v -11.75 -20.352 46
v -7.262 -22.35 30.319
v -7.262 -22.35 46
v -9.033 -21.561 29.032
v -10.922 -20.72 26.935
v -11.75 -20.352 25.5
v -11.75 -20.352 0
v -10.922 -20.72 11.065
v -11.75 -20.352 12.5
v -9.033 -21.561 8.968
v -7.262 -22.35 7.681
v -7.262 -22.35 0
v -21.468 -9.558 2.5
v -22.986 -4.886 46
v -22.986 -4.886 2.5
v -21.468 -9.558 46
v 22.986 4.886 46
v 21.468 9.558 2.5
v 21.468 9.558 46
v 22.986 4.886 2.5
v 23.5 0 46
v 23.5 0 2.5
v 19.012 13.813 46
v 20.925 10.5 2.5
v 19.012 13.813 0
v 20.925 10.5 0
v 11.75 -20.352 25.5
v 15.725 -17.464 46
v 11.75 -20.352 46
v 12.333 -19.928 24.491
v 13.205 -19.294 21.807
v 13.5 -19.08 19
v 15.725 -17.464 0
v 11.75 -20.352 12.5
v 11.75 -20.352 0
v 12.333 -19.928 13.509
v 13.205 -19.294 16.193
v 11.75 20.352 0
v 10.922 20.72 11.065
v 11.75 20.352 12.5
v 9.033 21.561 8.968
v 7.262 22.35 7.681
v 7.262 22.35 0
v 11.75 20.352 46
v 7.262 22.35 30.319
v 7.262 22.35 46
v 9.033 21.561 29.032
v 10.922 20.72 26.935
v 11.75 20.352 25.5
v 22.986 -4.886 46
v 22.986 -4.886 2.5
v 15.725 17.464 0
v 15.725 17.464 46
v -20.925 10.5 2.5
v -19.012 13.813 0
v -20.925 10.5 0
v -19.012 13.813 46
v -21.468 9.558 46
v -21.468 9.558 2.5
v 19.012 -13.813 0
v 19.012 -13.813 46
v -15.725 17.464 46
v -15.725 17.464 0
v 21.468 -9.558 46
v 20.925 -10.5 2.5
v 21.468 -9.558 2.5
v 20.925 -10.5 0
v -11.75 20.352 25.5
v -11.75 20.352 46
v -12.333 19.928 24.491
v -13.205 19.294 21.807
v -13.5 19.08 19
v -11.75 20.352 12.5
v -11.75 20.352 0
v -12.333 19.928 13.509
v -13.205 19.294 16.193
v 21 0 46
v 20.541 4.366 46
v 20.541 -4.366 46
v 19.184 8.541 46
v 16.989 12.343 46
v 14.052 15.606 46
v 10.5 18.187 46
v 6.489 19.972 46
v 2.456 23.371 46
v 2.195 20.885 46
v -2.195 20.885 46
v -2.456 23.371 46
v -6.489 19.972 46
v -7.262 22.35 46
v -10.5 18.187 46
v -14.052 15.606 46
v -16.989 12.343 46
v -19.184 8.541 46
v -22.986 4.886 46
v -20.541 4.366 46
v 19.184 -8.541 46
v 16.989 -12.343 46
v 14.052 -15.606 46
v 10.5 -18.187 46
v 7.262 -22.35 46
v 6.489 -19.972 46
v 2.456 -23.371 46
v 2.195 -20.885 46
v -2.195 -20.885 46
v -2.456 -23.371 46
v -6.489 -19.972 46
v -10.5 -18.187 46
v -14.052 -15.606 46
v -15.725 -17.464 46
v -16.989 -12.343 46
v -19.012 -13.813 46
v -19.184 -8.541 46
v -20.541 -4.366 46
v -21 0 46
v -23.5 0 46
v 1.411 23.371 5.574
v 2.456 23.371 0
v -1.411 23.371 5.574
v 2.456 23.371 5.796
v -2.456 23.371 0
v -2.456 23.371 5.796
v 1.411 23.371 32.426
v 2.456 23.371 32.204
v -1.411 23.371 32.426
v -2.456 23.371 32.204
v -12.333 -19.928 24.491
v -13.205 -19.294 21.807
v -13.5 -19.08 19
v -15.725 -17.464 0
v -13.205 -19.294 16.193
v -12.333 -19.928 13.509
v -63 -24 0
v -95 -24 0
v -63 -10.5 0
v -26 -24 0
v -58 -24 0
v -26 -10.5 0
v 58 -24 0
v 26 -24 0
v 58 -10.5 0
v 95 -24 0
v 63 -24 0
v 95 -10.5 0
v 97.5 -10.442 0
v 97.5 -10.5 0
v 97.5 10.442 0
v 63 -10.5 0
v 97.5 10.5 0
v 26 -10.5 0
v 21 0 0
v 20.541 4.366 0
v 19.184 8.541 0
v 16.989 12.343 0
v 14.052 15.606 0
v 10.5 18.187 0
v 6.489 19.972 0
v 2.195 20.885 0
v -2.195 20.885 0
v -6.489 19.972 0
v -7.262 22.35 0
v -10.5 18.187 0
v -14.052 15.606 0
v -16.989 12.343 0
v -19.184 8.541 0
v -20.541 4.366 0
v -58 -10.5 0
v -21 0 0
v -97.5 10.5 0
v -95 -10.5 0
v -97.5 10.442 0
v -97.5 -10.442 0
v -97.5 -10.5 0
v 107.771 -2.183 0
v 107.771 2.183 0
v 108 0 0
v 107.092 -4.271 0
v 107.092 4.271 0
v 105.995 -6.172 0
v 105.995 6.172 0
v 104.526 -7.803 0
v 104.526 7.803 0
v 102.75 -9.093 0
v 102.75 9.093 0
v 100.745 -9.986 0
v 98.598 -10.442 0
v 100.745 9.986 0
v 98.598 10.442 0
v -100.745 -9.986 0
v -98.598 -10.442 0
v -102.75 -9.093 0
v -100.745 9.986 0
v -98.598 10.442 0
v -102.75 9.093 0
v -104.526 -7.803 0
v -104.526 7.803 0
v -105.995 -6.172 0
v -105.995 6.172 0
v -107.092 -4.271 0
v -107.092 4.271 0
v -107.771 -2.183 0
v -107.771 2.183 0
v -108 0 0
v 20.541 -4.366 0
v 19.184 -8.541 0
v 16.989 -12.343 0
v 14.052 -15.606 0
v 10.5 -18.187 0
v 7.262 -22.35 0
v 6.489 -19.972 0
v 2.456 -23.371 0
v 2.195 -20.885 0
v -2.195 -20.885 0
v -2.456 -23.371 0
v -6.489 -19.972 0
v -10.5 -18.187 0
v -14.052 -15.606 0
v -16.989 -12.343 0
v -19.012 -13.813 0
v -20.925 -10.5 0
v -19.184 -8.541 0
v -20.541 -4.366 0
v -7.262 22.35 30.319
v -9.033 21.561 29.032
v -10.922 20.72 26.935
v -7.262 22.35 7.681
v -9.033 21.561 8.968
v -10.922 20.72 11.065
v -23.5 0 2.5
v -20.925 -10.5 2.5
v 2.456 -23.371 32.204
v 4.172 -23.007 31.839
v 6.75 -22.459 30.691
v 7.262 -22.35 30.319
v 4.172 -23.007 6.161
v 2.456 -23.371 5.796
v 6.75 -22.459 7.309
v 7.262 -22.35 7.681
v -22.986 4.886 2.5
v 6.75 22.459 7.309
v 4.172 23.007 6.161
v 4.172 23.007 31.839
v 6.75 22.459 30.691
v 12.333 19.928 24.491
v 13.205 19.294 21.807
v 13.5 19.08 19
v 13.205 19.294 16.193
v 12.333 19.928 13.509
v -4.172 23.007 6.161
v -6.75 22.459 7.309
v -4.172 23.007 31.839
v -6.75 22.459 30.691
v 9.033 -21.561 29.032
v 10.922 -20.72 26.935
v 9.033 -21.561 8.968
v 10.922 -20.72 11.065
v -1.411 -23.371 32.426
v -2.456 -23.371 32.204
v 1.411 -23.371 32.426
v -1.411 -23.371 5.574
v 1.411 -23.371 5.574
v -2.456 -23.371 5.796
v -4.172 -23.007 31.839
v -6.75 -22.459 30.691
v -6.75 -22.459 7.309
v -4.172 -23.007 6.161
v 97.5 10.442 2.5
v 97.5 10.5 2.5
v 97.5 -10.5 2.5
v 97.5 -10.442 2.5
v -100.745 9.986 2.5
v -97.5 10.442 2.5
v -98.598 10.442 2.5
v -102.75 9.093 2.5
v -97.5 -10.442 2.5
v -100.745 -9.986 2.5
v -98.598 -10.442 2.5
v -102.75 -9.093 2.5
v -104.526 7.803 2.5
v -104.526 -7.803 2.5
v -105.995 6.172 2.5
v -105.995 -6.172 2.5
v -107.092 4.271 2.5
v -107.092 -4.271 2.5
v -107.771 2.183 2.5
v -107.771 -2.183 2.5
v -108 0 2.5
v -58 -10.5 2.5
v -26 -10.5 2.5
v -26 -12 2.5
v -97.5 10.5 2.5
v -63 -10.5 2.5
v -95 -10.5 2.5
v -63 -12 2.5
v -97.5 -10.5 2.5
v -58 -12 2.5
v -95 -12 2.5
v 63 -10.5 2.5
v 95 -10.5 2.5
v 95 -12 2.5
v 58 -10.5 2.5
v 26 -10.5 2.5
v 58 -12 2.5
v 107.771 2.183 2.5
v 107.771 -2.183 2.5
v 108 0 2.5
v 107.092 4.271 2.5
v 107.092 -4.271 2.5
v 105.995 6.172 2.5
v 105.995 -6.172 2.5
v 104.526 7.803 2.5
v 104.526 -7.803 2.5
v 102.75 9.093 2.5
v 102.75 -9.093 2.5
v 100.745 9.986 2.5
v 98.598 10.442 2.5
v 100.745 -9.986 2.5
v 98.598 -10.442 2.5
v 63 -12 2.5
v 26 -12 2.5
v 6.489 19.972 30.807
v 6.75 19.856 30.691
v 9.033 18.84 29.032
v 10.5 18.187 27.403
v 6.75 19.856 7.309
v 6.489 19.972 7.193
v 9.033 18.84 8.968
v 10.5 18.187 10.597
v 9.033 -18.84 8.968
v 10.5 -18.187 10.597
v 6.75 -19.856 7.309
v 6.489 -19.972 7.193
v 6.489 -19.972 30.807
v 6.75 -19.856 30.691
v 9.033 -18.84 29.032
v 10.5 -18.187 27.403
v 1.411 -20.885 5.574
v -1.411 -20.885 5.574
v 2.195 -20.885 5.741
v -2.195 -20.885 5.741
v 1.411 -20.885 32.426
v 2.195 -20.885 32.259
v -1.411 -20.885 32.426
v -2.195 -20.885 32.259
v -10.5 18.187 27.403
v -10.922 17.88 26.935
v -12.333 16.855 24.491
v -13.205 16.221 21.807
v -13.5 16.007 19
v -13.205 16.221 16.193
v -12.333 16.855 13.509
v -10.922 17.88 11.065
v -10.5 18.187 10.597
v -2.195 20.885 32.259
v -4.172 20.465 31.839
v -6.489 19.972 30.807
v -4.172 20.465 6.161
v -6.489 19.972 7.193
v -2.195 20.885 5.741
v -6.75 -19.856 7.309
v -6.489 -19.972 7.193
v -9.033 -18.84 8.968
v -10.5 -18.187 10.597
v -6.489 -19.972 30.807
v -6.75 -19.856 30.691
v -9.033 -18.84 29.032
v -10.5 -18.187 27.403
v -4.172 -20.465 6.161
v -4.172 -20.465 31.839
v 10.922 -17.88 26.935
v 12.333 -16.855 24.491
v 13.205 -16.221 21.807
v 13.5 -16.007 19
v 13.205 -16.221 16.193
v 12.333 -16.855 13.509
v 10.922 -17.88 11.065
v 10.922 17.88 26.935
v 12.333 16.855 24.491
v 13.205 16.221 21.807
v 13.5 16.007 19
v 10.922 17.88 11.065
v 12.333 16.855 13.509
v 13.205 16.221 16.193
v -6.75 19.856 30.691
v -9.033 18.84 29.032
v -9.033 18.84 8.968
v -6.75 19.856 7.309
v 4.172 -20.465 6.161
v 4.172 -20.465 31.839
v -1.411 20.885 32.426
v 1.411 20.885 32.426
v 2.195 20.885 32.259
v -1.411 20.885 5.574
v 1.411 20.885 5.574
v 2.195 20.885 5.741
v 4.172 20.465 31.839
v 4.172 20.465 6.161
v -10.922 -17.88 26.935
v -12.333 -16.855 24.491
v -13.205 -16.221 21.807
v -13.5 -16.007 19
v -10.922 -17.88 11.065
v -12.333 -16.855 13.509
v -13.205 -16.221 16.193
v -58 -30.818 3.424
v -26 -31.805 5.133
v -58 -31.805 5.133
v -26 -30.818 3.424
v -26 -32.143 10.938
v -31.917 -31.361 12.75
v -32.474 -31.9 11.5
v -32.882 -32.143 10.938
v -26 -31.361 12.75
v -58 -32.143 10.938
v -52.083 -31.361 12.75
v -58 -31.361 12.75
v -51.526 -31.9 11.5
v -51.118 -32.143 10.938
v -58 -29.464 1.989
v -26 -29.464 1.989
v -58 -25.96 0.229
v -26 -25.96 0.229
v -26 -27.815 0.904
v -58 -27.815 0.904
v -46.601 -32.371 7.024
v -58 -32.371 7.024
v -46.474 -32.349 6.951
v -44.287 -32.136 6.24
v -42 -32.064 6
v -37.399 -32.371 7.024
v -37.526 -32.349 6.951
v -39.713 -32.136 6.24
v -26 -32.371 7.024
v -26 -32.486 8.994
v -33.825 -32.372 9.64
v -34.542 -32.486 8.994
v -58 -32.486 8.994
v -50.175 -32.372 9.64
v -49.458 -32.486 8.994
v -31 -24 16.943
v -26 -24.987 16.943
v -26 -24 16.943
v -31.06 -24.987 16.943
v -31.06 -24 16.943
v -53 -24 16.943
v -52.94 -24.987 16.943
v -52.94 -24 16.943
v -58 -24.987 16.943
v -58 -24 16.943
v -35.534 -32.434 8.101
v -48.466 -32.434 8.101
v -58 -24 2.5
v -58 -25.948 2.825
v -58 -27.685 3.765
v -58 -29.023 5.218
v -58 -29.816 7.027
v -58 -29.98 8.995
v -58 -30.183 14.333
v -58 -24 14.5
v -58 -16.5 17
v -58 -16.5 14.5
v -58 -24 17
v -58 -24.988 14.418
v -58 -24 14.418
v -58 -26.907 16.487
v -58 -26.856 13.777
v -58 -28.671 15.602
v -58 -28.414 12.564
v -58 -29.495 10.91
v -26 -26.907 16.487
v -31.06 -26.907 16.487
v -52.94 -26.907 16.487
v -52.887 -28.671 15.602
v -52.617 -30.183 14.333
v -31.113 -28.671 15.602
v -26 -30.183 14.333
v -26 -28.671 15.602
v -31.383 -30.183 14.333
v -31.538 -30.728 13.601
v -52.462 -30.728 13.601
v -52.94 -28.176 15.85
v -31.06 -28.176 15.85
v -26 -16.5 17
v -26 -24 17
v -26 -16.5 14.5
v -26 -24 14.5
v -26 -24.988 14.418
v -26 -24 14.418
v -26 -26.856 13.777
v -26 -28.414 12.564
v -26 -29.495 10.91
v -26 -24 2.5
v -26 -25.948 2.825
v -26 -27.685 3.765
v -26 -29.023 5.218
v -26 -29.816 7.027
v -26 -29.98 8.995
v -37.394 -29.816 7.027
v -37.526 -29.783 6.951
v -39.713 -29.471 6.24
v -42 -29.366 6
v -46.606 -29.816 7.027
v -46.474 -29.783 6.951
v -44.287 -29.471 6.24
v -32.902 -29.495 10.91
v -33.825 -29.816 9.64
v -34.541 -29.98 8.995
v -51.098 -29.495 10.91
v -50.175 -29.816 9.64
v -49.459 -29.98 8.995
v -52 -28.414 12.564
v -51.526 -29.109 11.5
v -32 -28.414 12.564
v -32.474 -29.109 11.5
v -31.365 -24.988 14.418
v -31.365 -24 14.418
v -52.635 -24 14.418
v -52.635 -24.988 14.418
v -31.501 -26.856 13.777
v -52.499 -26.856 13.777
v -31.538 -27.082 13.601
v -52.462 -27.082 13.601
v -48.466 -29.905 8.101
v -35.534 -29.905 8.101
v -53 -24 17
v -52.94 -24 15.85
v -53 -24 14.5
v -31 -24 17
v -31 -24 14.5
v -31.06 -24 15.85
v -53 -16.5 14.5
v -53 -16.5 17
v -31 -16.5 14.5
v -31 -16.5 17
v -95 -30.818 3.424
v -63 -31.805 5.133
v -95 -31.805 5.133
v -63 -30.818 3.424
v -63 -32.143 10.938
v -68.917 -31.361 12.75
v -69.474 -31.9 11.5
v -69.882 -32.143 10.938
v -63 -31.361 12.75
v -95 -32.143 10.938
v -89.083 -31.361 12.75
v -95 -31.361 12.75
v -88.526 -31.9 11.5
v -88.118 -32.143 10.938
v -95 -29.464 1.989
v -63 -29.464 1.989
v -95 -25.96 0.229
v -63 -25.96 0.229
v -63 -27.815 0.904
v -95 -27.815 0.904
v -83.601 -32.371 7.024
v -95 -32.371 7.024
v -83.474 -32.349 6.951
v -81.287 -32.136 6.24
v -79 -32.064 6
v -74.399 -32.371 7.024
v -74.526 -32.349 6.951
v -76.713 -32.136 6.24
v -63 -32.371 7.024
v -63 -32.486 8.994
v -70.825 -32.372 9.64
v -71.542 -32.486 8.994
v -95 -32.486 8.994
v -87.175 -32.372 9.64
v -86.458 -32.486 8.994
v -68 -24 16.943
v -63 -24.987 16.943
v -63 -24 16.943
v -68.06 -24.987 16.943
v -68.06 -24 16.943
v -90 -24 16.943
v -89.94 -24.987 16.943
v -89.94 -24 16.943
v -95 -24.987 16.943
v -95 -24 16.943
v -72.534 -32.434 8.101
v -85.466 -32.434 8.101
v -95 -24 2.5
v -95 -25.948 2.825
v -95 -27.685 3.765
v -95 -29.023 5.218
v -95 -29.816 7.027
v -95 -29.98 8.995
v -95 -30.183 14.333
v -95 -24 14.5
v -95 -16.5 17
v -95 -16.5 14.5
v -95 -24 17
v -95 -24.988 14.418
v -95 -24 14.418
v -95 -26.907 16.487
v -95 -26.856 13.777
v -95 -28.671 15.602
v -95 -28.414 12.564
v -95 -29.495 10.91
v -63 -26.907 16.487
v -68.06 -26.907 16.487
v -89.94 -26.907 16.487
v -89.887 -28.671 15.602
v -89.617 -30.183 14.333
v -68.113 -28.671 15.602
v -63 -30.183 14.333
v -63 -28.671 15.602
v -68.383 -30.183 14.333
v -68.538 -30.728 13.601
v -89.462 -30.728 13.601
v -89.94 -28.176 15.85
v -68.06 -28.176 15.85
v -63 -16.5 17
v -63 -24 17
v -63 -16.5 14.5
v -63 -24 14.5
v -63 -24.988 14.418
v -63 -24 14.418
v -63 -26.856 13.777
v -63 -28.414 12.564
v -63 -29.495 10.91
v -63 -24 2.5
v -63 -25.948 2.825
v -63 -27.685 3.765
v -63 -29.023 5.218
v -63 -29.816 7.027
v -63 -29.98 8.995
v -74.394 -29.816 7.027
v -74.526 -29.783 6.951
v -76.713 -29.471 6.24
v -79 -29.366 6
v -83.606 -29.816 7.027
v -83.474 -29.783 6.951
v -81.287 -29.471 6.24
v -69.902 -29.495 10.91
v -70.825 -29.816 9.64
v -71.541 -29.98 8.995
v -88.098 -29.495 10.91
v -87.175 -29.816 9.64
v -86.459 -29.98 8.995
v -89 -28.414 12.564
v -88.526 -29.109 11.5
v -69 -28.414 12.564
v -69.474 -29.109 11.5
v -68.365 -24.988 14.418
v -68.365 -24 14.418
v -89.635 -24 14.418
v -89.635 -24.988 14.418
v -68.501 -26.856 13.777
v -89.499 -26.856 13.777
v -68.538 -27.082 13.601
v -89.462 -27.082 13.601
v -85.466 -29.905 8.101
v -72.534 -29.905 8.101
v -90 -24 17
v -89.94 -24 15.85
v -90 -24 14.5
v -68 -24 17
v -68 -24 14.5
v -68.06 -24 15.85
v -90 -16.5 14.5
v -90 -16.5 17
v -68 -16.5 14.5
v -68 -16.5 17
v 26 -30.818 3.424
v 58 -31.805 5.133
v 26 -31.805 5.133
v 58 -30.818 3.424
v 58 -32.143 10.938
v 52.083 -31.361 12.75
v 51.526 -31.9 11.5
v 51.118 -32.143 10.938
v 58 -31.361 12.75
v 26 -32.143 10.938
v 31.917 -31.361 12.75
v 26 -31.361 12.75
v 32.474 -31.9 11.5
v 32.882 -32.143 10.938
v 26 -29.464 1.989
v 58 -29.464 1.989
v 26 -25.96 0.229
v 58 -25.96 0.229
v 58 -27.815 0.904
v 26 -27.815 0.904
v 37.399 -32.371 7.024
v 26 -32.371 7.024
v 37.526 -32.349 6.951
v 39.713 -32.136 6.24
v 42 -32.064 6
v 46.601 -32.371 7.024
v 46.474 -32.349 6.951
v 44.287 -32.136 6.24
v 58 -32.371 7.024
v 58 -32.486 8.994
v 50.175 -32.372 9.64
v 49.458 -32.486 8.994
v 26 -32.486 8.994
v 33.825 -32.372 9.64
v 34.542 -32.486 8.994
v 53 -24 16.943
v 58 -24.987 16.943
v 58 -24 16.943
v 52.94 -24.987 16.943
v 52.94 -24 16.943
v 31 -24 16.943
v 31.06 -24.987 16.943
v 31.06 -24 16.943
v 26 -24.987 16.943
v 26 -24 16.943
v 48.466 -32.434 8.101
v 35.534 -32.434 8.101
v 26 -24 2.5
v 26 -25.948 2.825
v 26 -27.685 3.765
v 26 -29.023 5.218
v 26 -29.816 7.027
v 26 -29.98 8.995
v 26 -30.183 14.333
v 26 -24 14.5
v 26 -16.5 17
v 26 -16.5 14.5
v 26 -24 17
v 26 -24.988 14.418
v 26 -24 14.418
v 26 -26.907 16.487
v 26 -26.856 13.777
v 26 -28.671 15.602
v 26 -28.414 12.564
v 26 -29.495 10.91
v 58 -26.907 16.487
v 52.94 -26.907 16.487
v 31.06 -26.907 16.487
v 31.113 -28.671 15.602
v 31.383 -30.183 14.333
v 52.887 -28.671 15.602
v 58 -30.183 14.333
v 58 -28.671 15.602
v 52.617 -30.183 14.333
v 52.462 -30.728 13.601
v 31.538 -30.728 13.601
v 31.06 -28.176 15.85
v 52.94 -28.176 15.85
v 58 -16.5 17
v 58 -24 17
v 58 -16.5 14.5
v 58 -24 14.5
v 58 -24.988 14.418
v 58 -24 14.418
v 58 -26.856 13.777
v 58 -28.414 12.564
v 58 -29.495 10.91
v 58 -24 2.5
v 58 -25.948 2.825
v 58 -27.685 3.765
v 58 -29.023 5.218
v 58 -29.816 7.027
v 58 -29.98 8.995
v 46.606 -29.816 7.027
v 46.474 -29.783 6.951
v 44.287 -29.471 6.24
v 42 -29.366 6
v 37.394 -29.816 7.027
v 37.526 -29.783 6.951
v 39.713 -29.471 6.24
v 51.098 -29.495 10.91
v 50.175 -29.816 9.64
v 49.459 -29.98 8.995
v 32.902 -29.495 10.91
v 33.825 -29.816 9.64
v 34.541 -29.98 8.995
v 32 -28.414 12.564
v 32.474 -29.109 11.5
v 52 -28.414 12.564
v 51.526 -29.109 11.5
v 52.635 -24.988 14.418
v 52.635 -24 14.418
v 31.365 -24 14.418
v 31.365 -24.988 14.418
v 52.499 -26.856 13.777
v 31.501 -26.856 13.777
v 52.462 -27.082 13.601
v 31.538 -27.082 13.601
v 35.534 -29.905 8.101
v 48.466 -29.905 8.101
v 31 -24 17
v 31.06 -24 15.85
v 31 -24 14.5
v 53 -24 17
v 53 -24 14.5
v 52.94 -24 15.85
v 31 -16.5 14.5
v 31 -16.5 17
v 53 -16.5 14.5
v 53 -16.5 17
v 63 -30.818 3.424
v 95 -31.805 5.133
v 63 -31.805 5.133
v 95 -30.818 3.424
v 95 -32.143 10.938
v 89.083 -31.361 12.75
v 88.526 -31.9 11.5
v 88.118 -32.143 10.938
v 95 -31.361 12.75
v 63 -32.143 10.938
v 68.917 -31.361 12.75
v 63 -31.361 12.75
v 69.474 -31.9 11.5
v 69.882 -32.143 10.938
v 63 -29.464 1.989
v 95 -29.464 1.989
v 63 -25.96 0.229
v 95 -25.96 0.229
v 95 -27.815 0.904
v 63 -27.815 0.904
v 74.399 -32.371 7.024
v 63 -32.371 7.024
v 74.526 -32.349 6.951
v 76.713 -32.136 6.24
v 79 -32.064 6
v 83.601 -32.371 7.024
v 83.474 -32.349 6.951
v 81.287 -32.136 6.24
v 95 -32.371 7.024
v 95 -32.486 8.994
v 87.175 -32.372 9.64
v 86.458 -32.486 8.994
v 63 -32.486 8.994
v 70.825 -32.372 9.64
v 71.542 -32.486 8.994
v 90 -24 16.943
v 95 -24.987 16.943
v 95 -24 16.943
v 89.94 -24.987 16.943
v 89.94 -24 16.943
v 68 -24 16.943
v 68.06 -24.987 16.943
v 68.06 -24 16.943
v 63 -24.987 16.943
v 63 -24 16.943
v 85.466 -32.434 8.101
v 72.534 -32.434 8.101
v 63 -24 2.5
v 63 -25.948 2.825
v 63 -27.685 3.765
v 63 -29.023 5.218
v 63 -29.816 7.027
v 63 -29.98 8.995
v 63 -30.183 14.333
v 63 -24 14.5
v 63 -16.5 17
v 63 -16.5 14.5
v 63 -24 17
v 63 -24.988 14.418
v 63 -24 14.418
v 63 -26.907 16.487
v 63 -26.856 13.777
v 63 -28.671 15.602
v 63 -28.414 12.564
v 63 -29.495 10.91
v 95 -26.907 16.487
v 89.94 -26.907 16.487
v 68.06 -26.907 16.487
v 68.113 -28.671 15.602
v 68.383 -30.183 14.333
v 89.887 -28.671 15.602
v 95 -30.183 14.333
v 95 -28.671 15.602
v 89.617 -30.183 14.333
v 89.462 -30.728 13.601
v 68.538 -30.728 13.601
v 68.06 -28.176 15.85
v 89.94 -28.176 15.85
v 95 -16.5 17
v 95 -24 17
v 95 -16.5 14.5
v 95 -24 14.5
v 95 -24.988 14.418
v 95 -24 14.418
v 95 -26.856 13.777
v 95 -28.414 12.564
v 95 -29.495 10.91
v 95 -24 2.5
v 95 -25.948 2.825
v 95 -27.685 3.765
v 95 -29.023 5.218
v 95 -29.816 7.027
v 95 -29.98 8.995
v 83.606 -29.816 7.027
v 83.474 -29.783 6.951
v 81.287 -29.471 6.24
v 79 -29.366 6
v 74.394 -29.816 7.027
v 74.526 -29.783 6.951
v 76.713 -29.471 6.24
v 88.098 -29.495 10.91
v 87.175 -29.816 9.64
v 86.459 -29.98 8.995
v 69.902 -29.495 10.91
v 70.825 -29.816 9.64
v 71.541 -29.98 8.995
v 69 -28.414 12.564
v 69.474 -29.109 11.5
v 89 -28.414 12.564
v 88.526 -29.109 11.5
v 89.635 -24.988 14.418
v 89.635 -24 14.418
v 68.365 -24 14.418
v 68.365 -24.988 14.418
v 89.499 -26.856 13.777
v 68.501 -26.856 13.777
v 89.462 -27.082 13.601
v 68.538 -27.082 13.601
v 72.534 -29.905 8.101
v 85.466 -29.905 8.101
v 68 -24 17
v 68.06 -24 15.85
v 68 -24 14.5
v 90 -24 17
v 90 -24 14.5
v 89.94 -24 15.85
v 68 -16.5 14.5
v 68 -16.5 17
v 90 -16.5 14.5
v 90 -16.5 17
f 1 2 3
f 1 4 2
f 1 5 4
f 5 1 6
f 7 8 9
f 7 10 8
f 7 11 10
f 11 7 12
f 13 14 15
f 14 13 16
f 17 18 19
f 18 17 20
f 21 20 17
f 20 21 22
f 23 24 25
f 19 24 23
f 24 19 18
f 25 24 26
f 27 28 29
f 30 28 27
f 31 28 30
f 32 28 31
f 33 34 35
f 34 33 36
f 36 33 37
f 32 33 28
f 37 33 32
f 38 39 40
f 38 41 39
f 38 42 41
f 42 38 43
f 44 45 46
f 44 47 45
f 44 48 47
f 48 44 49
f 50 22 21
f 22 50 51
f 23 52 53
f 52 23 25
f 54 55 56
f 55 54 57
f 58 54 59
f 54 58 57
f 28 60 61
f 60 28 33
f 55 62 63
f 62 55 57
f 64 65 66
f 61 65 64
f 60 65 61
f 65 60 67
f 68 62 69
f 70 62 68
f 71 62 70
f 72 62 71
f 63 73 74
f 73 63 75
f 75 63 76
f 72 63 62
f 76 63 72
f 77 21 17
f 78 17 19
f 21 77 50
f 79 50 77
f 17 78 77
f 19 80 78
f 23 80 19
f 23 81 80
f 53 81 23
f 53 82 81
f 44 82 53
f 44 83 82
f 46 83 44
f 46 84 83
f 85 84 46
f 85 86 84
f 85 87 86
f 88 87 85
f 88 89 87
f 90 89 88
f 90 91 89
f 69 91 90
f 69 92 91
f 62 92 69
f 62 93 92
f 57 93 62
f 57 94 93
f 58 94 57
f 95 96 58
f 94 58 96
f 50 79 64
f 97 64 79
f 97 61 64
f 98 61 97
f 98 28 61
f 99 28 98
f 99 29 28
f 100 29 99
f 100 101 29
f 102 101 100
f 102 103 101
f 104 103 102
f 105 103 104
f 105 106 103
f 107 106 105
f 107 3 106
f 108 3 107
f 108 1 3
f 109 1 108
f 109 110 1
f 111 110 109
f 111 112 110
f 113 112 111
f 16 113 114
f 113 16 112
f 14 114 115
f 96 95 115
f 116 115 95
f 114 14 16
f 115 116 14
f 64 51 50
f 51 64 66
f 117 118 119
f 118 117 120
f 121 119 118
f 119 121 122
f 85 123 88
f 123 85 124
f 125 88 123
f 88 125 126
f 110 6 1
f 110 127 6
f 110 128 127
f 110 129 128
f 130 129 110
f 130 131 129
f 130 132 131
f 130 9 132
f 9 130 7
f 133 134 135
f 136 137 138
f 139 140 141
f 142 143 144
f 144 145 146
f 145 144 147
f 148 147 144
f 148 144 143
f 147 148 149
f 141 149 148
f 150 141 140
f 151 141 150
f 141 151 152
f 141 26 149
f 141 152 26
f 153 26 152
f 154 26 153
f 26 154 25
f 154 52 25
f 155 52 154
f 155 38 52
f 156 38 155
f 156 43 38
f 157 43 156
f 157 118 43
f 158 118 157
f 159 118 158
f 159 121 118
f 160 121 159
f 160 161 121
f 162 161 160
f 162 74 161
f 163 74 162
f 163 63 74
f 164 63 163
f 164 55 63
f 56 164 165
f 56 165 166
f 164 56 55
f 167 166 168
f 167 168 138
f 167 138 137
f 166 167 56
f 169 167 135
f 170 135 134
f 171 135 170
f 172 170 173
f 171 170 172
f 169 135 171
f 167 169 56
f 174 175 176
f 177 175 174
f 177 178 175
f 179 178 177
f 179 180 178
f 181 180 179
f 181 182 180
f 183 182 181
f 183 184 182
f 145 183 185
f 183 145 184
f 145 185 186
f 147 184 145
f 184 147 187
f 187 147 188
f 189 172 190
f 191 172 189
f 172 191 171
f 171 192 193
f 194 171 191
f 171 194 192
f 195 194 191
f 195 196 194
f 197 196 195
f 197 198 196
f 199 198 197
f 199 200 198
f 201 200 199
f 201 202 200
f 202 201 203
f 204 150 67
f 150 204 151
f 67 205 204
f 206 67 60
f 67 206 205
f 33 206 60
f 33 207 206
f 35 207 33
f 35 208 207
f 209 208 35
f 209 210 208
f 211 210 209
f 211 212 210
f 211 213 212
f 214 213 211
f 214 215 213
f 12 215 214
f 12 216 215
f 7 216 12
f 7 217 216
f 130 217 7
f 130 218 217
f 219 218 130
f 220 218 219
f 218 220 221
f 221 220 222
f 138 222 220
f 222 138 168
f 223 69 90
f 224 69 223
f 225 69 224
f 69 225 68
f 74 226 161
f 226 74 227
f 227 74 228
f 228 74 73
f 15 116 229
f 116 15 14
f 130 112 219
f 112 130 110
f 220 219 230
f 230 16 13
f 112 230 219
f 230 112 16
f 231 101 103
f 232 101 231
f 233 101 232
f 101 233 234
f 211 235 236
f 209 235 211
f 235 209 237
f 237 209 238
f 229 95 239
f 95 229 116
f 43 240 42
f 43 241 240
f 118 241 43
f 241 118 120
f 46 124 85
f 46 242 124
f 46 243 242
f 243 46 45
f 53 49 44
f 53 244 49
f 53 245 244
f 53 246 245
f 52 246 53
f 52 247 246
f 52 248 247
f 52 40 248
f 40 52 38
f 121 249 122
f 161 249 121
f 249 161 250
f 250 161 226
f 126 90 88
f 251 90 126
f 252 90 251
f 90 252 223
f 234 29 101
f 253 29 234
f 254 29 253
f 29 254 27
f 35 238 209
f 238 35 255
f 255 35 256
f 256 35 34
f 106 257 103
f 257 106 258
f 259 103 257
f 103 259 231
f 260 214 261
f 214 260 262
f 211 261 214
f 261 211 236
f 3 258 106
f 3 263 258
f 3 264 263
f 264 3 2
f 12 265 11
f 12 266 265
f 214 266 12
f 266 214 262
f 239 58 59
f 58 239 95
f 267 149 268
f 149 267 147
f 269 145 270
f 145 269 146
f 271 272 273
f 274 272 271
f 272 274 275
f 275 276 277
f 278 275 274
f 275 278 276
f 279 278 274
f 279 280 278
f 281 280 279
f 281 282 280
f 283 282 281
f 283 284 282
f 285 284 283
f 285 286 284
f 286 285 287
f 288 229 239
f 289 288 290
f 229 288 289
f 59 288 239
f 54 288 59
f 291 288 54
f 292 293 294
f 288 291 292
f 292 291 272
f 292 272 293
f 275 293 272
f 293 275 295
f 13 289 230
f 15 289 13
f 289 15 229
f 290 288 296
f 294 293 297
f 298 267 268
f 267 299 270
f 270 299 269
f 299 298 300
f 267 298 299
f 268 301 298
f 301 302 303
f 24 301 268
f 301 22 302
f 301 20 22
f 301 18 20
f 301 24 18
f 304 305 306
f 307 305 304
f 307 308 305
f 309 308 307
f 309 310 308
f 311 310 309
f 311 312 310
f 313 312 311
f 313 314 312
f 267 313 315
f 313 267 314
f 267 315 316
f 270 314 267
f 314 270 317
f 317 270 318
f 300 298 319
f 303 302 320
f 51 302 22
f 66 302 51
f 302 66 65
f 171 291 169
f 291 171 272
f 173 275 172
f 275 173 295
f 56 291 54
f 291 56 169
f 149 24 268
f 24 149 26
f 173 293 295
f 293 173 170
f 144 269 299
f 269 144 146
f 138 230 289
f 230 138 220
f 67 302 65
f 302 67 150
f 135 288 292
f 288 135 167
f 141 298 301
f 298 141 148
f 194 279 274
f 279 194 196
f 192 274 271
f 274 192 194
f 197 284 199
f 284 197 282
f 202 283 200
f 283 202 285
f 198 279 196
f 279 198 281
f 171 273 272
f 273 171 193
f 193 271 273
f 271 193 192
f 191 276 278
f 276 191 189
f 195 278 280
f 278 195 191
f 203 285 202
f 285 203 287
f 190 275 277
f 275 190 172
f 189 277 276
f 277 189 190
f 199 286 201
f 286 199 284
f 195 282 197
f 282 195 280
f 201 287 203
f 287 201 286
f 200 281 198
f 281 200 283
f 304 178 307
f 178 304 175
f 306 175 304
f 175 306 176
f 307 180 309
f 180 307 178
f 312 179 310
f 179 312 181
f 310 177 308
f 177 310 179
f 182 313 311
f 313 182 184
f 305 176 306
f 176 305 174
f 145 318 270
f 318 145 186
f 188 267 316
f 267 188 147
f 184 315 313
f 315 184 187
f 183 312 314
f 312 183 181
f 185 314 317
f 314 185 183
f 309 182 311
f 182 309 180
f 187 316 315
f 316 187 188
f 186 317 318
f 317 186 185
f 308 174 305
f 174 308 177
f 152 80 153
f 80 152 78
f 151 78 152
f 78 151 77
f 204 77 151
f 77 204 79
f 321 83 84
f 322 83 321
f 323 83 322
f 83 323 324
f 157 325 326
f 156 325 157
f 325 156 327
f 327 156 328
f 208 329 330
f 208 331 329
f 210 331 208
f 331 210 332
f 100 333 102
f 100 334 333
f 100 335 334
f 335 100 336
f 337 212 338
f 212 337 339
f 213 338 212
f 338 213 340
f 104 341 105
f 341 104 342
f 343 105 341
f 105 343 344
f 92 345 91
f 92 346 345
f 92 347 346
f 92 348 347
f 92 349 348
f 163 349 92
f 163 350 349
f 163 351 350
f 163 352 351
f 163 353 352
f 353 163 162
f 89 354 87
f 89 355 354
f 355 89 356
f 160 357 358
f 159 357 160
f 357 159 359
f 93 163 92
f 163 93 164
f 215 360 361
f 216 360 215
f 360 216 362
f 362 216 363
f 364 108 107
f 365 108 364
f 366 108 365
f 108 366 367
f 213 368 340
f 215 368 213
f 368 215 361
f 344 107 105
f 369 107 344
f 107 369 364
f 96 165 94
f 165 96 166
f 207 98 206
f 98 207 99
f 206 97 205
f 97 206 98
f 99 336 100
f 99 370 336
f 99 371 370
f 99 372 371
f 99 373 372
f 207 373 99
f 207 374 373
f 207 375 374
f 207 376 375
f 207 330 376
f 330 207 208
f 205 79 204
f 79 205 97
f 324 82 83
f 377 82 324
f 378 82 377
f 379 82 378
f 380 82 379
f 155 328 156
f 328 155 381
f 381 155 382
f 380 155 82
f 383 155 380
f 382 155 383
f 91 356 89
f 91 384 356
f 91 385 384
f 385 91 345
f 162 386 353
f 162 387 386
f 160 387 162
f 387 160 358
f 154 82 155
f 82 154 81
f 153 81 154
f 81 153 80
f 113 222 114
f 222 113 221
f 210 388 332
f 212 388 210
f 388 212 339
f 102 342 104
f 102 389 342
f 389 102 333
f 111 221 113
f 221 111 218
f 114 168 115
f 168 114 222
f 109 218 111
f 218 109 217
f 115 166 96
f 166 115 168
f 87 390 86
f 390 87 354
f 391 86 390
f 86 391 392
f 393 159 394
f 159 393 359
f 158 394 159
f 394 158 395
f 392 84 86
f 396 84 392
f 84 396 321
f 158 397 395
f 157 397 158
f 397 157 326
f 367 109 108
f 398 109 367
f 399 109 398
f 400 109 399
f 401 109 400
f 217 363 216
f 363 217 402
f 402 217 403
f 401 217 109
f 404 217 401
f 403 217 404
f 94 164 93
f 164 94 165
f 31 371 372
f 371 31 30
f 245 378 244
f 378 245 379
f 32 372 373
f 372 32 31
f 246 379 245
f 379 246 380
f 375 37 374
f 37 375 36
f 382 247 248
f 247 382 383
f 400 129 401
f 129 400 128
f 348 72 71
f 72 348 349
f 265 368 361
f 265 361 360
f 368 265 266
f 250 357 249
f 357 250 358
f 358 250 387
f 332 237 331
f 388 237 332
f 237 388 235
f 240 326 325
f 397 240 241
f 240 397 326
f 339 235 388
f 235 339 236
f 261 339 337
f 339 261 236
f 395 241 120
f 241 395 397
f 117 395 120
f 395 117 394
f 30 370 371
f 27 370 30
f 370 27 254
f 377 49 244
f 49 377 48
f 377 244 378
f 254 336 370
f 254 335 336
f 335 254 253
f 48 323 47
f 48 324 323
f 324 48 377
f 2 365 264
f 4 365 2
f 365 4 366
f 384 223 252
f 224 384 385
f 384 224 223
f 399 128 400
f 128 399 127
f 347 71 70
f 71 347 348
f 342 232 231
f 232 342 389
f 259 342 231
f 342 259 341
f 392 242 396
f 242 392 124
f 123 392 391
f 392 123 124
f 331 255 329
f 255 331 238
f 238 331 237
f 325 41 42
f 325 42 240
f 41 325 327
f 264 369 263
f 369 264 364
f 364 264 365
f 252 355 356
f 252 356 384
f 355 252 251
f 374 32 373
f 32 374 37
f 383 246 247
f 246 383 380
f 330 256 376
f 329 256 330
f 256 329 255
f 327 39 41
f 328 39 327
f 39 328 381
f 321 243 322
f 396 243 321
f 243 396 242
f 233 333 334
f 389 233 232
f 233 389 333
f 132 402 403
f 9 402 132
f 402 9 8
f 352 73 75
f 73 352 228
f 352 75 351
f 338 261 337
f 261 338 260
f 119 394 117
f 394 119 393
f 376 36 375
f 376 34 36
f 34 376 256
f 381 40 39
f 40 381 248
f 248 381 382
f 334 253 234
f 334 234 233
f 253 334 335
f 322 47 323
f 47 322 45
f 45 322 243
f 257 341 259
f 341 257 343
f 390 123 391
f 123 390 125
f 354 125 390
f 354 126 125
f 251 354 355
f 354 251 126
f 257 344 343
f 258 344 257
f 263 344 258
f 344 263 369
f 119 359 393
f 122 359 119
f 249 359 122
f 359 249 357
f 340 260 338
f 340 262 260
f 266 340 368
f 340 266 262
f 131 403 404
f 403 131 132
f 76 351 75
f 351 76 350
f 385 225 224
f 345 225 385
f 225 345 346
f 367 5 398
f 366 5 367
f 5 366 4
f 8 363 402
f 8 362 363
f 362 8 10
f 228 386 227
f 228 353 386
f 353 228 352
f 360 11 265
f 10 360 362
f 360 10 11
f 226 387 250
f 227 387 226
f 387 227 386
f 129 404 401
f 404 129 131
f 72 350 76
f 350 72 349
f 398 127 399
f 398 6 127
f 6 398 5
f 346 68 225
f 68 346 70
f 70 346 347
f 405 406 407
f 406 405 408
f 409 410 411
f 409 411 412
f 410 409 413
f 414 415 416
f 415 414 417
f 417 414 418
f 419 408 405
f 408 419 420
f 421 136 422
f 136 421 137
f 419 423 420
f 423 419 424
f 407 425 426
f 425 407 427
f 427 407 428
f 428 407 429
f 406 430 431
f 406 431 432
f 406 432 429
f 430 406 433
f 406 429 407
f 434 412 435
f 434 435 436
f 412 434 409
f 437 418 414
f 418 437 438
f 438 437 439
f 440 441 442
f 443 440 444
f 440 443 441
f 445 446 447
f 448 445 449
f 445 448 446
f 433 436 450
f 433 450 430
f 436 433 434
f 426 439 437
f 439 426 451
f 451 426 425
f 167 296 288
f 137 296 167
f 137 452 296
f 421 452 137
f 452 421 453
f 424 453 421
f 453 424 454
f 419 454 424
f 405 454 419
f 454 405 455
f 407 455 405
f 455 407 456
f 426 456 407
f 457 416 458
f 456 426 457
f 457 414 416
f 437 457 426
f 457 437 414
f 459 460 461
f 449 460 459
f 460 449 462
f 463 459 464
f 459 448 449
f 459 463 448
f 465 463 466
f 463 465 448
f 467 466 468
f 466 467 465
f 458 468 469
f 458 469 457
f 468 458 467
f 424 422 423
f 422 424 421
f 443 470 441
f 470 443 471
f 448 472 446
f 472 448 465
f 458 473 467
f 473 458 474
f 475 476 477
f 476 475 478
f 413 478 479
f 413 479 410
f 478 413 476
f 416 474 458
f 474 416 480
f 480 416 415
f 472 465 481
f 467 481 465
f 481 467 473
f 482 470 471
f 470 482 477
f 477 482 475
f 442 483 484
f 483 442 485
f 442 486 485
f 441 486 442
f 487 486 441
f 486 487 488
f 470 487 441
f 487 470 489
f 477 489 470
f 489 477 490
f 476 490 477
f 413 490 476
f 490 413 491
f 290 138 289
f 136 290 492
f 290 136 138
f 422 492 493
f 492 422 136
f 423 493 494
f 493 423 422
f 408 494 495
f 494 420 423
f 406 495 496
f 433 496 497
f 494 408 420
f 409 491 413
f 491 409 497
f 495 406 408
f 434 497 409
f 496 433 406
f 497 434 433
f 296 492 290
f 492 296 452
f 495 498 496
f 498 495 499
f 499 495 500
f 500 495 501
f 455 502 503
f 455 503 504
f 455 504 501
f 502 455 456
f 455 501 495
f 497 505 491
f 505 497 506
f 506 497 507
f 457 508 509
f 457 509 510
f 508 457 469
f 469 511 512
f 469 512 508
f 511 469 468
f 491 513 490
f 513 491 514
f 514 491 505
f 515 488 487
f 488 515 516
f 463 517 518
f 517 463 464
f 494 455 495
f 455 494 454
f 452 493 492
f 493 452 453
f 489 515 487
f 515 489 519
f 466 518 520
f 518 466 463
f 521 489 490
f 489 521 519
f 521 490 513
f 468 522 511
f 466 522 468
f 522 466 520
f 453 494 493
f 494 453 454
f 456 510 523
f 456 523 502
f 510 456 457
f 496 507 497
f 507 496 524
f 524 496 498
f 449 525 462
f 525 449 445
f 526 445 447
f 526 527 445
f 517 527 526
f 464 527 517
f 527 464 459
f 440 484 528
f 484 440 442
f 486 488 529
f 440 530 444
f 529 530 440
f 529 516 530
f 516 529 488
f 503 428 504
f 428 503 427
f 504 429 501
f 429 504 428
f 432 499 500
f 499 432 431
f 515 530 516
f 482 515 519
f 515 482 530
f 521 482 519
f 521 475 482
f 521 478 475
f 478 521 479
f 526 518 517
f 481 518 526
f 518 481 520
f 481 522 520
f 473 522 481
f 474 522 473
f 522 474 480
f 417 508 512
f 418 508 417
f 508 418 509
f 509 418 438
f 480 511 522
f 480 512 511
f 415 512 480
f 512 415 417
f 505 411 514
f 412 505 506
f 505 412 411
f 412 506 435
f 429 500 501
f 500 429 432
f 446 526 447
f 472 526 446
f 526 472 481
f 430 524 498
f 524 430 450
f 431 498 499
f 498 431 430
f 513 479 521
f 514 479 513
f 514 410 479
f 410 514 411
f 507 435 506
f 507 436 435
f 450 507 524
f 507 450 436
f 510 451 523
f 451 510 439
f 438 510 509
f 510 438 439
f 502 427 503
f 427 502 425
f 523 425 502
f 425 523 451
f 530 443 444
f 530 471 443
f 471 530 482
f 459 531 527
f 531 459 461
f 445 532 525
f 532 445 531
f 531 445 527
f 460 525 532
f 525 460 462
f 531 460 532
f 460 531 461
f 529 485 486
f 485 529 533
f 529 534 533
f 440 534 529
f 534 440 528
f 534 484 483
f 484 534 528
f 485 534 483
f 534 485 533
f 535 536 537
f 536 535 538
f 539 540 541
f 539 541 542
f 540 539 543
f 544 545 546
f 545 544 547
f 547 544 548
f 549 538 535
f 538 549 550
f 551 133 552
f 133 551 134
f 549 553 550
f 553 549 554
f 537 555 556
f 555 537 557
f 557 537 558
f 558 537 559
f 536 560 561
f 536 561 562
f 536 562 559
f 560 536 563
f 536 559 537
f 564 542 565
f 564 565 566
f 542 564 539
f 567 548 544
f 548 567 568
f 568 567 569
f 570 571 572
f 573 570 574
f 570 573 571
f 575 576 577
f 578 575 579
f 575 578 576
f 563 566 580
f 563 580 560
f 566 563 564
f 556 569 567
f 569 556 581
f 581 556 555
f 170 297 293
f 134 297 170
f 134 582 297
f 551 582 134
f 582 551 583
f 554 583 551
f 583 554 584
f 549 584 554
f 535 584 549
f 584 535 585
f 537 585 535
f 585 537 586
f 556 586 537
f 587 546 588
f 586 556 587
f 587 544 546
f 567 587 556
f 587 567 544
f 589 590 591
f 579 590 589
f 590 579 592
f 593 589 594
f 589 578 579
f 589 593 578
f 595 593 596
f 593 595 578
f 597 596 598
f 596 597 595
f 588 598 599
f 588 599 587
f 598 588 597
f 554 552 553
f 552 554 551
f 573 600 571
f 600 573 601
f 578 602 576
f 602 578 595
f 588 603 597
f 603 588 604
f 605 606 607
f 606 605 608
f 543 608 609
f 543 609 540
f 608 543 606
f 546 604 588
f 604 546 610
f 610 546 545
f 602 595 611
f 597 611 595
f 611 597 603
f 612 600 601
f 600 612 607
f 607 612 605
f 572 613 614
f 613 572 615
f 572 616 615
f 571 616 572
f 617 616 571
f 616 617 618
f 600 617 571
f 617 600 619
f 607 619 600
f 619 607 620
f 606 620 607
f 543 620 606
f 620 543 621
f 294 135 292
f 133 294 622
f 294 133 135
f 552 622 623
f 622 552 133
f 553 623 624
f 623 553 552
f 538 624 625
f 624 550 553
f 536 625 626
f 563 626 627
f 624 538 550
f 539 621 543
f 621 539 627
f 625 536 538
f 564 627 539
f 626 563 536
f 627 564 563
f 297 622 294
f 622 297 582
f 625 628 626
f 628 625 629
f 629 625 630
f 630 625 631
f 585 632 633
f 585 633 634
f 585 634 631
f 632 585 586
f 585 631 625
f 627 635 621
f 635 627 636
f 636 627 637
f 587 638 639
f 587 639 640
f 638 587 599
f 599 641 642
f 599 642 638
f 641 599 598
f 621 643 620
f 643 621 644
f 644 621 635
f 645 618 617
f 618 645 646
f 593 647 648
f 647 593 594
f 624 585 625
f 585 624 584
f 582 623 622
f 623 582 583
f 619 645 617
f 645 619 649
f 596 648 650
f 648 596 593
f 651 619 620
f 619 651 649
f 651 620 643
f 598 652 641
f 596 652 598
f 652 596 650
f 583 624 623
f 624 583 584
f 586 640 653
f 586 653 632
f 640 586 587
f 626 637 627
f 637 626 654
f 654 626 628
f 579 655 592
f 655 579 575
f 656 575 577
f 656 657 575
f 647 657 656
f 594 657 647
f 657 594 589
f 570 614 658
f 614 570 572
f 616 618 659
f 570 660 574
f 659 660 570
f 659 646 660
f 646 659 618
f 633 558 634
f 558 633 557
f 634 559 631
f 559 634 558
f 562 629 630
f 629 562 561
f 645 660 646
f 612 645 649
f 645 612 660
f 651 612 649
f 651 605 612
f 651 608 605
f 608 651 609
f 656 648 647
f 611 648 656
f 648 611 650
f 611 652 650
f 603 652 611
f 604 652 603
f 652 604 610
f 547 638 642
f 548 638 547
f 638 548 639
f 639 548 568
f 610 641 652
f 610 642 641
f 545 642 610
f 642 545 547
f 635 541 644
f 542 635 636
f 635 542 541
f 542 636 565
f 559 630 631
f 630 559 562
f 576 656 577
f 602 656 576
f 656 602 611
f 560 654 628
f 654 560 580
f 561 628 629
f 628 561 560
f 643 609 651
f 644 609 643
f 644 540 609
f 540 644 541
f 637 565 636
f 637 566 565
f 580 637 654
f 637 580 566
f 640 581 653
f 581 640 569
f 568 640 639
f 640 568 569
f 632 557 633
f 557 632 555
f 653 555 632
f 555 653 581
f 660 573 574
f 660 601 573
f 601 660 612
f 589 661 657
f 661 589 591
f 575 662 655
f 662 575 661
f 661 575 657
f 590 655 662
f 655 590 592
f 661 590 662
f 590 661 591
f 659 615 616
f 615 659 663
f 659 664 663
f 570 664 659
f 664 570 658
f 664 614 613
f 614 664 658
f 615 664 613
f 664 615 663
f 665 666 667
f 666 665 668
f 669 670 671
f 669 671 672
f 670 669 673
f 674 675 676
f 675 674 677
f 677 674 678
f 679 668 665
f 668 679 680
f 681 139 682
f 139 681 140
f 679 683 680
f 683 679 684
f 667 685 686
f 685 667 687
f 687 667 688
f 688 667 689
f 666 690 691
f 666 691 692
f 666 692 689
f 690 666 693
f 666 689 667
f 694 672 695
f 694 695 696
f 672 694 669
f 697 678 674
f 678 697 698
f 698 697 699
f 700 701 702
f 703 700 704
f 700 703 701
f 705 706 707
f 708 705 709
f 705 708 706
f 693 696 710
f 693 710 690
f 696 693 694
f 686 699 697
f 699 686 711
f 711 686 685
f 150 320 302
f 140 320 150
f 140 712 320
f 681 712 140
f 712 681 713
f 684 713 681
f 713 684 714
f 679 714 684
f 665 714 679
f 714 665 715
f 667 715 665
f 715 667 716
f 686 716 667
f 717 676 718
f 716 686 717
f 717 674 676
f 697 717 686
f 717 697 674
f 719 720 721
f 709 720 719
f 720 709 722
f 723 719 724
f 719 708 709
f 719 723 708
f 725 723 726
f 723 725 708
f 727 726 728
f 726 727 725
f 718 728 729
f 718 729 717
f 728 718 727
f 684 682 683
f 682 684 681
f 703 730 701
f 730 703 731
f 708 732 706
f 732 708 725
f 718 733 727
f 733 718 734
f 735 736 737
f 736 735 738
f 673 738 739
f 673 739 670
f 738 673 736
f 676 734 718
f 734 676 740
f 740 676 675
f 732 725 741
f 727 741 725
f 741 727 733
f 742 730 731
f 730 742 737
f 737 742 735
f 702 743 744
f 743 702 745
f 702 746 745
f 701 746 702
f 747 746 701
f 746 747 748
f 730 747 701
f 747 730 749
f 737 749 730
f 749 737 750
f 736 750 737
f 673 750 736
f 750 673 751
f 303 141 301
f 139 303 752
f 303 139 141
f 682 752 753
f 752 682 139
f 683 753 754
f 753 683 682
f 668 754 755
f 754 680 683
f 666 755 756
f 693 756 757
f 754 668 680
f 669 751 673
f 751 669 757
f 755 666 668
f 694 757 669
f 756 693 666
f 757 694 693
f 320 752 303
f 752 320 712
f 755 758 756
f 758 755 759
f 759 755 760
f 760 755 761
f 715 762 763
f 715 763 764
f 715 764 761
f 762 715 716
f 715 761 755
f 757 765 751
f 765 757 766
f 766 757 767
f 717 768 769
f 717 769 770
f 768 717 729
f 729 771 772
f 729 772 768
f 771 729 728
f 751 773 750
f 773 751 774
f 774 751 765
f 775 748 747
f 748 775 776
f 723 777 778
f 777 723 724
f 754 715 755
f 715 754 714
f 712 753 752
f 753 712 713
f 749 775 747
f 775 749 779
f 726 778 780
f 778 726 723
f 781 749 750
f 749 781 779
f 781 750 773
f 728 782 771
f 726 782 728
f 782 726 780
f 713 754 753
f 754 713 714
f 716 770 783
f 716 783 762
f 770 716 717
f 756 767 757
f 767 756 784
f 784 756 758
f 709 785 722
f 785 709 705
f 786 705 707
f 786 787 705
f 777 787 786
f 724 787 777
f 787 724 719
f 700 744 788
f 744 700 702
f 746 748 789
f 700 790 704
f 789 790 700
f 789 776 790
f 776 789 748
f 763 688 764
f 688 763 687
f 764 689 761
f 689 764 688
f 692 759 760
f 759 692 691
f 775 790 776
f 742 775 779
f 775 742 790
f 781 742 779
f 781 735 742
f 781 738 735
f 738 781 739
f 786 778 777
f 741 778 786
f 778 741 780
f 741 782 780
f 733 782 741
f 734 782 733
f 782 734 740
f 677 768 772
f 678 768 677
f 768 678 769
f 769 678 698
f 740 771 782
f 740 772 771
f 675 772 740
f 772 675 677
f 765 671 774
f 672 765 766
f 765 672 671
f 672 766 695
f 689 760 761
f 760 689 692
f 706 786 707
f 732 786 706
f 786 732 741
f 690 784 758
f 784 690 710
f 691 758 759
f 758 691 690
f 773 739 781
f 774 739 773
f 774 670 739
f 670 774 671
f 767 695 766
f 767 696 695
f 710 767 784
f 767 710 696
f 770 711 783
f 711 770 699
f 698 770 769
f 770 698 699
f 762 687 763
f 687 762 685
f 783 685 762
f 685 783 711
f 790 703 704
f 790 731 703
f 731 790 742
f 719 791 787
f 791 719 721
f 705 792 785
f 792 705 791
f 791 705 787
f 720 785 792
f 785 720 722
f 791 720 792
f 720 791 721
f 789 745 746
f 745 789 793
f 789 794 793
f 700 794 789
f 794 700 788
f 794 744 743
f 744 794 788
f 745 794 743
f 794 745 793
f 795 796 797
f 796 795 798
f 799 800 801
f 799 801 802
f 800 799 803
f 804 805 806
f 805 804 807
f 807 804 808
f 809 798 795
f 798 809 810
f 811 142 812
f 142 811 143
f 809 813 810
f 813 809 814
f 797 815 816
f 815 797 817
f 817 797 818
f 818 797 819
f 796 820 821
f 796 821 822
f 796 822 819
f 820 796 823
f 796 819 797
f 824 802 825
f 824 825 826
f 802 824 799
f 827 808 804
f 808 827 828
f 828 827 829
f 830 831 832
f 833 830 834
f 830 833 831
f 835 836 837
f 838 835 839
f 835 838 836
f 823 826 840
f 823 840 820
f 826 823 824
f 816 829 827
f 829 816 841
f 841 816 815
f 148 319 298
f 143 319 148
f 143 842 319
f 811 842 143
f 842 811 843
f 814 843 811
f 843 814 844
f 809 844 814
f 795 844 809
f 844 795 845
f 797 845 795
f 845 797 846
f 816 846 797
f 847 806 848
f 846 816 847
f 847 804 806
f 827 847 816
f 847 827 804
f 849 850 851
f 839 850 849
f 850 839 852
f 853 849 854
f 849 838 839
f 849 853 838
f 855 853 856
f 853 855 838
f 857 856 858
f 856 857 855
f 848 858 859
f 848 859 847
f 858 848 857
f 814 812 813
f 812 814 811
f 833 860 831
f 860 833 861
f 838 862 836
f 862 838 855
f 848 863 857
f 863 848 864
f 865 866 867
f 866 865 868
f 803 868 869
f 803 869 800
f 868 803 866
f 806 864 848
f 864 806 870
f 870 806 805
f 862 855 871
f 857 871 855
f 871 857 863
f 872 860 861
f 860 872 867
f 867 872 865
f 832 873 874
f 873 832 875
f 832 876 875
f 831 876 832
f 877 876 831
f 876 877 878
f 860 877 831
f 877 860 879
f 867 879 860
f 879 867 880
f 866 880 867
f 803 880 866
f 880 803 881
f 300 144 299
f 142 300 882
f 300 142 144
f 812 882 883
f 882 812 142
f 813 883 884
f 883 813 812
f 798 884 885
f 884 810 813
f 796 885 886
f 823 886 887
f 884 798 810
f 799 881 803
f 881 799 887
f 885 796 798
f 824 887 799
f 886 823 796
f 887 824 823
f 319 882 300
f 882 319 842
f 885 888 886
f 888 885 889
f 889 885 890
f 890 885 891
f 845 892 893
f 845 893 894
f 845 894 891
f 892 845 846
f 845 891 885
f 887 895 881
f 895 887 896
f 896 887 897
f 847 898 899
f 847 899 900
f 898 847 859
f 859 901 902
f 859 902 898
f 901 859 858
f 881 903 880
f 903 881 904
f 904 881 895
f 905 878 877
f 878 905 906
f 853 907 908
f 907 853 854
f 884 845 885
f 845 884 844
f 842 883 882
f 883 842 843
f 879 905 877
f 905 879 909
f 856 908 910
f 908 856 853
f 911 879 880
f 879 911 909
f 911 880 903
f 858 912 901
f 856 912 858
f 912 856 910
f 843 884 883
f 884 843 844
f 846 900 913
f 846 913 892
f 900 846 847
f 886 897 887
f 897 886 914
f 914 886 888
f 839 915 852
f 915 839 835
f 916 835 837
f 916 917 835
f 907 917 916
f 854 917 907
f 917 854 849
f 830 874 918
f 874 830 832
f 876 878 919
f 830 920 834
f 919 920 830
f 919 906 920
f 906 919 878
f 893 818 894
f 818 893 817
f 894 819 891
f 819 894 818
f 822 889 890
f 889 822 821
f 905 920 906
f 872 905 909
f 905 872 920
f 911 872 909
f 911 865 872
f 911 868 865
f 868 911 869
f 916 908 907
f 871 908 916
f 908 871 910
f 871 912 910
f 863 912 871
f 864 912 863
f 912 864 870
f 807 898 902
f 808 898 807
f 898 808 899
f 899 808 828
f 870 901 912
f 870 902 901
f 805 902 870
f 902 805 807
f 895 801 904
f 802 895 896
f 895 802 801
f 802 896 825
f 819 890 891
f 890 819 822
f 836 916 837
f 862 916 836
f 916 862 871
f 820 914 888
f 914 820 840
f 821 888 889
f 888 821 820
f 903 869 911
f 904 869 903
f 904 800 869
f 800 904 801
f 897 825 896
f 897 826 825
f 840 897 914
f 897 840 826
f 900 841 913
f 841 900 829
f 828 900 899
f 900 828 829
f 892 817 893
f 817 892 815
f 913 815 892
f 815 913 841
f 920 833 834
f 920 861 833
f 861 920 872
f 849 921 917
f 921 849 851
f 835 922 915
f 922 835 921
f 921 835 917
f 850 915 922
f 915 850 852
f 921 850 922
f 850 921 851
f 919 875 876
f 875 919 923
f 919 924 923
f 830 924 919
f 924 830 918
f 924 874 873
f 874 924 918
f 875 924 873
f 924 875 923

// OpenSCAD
// Drzak holitek na sprchovou tyc
// navleka se na dolni konzoli
// tloustka steny
wall = 2.5;
// prumer konsole
konsd1 = 42;
// prumer tycky
tycd1 = 27;
// hloubka uchyceni
uchyth = 19;
// sirka drzaku
drzaks = 32;
drzakob = 12;
drzakmez = 22;
pdrz = 4;

module uchyceni() {
//  sirkapasu na drzaky pdrz*(drzaks+2*wall)+(konsd+2*wall)
  sirkapasu = pdrz*(drzaks+2*wall)+(konsd1+2*wall); 
  difference() {
    union() {
      cylinder(h=uchyth+tycd1, d=konsd1+2*wall);
      translate([-(sirkapasu/2),-(konsd1/4),0]) cube([sirkapasu,konsd1/2,wall]);
      translate([-(sirkapasu/2),0,0]) cylinder(h=wall,d=konsd1/2);
      translate([sirkapasu/2,0,0]) cylinder(h=wall,d=konsd1/2);  
    }    
    union() {
      cylinder(h=uchyth+tycd1, d=konsd1);  
      translate([0,(konsd1 + 2*wall)/2,uchyth]) 
        rotate([90,0,0]) 
          cylinder(h = konsd1+2*wall, d = tycd1);  
    }  
   }
}

module drzak() {
  translate([-drzaks/2,0,drzakob/2+wall])
    rotate([0,90,0])
    union() {
    translate([-(drzakob/2+wall), 0 ,0]) cube([wall,3*wall,(drzaks - drzakmez)/2]); 
    translate([-(drzakob/2+wall), 0 ,drzaks-(drzaks - drzakmez)/2]) cube([wall,3*wall,(drzaks - drzakmez)/2]); 
    difference() { 
        union() {
            cylinder(h=drzaks, d=drzakob+2*wall);
            translate([drzakob/2, 0 ,0]) cube([wall,drzaks,drzaks]); 
        } 
        union() { // odcitana cast
           cylinder(h=drzaks,d=drzakob); 
           translate([-(drzakob/2+2*wall), 0 ,0]) cube([drzakob+2*wall,drzakob,drzaks]);
           translate([-(drzakob/2+wall), -drzakob,drzaks/2]) rotate([-90,0,0]) cylinder(h=drzaks, d=drzakmez); 
       }
   }
  }
}



uchyceni();
translate([-(drzaks/2 + konsd1/2 + 2*wall),-(1.5*drzaks)/2,0]) drzak();
translate([-(drzaks + drzaks/2 + konsd1/2 + 4*wall),-(1.5*drzaks)/2,0]) drzak();
translate([(drzaks/2 + konsd1/2 + 2*wall),-(1.5*drzaks)/2,0]) drzak();
translate([(drzaks + drzaks/2 + konsd1/2 + 4*wall),-(1.5*drzaks)/2,0]) drzak();
